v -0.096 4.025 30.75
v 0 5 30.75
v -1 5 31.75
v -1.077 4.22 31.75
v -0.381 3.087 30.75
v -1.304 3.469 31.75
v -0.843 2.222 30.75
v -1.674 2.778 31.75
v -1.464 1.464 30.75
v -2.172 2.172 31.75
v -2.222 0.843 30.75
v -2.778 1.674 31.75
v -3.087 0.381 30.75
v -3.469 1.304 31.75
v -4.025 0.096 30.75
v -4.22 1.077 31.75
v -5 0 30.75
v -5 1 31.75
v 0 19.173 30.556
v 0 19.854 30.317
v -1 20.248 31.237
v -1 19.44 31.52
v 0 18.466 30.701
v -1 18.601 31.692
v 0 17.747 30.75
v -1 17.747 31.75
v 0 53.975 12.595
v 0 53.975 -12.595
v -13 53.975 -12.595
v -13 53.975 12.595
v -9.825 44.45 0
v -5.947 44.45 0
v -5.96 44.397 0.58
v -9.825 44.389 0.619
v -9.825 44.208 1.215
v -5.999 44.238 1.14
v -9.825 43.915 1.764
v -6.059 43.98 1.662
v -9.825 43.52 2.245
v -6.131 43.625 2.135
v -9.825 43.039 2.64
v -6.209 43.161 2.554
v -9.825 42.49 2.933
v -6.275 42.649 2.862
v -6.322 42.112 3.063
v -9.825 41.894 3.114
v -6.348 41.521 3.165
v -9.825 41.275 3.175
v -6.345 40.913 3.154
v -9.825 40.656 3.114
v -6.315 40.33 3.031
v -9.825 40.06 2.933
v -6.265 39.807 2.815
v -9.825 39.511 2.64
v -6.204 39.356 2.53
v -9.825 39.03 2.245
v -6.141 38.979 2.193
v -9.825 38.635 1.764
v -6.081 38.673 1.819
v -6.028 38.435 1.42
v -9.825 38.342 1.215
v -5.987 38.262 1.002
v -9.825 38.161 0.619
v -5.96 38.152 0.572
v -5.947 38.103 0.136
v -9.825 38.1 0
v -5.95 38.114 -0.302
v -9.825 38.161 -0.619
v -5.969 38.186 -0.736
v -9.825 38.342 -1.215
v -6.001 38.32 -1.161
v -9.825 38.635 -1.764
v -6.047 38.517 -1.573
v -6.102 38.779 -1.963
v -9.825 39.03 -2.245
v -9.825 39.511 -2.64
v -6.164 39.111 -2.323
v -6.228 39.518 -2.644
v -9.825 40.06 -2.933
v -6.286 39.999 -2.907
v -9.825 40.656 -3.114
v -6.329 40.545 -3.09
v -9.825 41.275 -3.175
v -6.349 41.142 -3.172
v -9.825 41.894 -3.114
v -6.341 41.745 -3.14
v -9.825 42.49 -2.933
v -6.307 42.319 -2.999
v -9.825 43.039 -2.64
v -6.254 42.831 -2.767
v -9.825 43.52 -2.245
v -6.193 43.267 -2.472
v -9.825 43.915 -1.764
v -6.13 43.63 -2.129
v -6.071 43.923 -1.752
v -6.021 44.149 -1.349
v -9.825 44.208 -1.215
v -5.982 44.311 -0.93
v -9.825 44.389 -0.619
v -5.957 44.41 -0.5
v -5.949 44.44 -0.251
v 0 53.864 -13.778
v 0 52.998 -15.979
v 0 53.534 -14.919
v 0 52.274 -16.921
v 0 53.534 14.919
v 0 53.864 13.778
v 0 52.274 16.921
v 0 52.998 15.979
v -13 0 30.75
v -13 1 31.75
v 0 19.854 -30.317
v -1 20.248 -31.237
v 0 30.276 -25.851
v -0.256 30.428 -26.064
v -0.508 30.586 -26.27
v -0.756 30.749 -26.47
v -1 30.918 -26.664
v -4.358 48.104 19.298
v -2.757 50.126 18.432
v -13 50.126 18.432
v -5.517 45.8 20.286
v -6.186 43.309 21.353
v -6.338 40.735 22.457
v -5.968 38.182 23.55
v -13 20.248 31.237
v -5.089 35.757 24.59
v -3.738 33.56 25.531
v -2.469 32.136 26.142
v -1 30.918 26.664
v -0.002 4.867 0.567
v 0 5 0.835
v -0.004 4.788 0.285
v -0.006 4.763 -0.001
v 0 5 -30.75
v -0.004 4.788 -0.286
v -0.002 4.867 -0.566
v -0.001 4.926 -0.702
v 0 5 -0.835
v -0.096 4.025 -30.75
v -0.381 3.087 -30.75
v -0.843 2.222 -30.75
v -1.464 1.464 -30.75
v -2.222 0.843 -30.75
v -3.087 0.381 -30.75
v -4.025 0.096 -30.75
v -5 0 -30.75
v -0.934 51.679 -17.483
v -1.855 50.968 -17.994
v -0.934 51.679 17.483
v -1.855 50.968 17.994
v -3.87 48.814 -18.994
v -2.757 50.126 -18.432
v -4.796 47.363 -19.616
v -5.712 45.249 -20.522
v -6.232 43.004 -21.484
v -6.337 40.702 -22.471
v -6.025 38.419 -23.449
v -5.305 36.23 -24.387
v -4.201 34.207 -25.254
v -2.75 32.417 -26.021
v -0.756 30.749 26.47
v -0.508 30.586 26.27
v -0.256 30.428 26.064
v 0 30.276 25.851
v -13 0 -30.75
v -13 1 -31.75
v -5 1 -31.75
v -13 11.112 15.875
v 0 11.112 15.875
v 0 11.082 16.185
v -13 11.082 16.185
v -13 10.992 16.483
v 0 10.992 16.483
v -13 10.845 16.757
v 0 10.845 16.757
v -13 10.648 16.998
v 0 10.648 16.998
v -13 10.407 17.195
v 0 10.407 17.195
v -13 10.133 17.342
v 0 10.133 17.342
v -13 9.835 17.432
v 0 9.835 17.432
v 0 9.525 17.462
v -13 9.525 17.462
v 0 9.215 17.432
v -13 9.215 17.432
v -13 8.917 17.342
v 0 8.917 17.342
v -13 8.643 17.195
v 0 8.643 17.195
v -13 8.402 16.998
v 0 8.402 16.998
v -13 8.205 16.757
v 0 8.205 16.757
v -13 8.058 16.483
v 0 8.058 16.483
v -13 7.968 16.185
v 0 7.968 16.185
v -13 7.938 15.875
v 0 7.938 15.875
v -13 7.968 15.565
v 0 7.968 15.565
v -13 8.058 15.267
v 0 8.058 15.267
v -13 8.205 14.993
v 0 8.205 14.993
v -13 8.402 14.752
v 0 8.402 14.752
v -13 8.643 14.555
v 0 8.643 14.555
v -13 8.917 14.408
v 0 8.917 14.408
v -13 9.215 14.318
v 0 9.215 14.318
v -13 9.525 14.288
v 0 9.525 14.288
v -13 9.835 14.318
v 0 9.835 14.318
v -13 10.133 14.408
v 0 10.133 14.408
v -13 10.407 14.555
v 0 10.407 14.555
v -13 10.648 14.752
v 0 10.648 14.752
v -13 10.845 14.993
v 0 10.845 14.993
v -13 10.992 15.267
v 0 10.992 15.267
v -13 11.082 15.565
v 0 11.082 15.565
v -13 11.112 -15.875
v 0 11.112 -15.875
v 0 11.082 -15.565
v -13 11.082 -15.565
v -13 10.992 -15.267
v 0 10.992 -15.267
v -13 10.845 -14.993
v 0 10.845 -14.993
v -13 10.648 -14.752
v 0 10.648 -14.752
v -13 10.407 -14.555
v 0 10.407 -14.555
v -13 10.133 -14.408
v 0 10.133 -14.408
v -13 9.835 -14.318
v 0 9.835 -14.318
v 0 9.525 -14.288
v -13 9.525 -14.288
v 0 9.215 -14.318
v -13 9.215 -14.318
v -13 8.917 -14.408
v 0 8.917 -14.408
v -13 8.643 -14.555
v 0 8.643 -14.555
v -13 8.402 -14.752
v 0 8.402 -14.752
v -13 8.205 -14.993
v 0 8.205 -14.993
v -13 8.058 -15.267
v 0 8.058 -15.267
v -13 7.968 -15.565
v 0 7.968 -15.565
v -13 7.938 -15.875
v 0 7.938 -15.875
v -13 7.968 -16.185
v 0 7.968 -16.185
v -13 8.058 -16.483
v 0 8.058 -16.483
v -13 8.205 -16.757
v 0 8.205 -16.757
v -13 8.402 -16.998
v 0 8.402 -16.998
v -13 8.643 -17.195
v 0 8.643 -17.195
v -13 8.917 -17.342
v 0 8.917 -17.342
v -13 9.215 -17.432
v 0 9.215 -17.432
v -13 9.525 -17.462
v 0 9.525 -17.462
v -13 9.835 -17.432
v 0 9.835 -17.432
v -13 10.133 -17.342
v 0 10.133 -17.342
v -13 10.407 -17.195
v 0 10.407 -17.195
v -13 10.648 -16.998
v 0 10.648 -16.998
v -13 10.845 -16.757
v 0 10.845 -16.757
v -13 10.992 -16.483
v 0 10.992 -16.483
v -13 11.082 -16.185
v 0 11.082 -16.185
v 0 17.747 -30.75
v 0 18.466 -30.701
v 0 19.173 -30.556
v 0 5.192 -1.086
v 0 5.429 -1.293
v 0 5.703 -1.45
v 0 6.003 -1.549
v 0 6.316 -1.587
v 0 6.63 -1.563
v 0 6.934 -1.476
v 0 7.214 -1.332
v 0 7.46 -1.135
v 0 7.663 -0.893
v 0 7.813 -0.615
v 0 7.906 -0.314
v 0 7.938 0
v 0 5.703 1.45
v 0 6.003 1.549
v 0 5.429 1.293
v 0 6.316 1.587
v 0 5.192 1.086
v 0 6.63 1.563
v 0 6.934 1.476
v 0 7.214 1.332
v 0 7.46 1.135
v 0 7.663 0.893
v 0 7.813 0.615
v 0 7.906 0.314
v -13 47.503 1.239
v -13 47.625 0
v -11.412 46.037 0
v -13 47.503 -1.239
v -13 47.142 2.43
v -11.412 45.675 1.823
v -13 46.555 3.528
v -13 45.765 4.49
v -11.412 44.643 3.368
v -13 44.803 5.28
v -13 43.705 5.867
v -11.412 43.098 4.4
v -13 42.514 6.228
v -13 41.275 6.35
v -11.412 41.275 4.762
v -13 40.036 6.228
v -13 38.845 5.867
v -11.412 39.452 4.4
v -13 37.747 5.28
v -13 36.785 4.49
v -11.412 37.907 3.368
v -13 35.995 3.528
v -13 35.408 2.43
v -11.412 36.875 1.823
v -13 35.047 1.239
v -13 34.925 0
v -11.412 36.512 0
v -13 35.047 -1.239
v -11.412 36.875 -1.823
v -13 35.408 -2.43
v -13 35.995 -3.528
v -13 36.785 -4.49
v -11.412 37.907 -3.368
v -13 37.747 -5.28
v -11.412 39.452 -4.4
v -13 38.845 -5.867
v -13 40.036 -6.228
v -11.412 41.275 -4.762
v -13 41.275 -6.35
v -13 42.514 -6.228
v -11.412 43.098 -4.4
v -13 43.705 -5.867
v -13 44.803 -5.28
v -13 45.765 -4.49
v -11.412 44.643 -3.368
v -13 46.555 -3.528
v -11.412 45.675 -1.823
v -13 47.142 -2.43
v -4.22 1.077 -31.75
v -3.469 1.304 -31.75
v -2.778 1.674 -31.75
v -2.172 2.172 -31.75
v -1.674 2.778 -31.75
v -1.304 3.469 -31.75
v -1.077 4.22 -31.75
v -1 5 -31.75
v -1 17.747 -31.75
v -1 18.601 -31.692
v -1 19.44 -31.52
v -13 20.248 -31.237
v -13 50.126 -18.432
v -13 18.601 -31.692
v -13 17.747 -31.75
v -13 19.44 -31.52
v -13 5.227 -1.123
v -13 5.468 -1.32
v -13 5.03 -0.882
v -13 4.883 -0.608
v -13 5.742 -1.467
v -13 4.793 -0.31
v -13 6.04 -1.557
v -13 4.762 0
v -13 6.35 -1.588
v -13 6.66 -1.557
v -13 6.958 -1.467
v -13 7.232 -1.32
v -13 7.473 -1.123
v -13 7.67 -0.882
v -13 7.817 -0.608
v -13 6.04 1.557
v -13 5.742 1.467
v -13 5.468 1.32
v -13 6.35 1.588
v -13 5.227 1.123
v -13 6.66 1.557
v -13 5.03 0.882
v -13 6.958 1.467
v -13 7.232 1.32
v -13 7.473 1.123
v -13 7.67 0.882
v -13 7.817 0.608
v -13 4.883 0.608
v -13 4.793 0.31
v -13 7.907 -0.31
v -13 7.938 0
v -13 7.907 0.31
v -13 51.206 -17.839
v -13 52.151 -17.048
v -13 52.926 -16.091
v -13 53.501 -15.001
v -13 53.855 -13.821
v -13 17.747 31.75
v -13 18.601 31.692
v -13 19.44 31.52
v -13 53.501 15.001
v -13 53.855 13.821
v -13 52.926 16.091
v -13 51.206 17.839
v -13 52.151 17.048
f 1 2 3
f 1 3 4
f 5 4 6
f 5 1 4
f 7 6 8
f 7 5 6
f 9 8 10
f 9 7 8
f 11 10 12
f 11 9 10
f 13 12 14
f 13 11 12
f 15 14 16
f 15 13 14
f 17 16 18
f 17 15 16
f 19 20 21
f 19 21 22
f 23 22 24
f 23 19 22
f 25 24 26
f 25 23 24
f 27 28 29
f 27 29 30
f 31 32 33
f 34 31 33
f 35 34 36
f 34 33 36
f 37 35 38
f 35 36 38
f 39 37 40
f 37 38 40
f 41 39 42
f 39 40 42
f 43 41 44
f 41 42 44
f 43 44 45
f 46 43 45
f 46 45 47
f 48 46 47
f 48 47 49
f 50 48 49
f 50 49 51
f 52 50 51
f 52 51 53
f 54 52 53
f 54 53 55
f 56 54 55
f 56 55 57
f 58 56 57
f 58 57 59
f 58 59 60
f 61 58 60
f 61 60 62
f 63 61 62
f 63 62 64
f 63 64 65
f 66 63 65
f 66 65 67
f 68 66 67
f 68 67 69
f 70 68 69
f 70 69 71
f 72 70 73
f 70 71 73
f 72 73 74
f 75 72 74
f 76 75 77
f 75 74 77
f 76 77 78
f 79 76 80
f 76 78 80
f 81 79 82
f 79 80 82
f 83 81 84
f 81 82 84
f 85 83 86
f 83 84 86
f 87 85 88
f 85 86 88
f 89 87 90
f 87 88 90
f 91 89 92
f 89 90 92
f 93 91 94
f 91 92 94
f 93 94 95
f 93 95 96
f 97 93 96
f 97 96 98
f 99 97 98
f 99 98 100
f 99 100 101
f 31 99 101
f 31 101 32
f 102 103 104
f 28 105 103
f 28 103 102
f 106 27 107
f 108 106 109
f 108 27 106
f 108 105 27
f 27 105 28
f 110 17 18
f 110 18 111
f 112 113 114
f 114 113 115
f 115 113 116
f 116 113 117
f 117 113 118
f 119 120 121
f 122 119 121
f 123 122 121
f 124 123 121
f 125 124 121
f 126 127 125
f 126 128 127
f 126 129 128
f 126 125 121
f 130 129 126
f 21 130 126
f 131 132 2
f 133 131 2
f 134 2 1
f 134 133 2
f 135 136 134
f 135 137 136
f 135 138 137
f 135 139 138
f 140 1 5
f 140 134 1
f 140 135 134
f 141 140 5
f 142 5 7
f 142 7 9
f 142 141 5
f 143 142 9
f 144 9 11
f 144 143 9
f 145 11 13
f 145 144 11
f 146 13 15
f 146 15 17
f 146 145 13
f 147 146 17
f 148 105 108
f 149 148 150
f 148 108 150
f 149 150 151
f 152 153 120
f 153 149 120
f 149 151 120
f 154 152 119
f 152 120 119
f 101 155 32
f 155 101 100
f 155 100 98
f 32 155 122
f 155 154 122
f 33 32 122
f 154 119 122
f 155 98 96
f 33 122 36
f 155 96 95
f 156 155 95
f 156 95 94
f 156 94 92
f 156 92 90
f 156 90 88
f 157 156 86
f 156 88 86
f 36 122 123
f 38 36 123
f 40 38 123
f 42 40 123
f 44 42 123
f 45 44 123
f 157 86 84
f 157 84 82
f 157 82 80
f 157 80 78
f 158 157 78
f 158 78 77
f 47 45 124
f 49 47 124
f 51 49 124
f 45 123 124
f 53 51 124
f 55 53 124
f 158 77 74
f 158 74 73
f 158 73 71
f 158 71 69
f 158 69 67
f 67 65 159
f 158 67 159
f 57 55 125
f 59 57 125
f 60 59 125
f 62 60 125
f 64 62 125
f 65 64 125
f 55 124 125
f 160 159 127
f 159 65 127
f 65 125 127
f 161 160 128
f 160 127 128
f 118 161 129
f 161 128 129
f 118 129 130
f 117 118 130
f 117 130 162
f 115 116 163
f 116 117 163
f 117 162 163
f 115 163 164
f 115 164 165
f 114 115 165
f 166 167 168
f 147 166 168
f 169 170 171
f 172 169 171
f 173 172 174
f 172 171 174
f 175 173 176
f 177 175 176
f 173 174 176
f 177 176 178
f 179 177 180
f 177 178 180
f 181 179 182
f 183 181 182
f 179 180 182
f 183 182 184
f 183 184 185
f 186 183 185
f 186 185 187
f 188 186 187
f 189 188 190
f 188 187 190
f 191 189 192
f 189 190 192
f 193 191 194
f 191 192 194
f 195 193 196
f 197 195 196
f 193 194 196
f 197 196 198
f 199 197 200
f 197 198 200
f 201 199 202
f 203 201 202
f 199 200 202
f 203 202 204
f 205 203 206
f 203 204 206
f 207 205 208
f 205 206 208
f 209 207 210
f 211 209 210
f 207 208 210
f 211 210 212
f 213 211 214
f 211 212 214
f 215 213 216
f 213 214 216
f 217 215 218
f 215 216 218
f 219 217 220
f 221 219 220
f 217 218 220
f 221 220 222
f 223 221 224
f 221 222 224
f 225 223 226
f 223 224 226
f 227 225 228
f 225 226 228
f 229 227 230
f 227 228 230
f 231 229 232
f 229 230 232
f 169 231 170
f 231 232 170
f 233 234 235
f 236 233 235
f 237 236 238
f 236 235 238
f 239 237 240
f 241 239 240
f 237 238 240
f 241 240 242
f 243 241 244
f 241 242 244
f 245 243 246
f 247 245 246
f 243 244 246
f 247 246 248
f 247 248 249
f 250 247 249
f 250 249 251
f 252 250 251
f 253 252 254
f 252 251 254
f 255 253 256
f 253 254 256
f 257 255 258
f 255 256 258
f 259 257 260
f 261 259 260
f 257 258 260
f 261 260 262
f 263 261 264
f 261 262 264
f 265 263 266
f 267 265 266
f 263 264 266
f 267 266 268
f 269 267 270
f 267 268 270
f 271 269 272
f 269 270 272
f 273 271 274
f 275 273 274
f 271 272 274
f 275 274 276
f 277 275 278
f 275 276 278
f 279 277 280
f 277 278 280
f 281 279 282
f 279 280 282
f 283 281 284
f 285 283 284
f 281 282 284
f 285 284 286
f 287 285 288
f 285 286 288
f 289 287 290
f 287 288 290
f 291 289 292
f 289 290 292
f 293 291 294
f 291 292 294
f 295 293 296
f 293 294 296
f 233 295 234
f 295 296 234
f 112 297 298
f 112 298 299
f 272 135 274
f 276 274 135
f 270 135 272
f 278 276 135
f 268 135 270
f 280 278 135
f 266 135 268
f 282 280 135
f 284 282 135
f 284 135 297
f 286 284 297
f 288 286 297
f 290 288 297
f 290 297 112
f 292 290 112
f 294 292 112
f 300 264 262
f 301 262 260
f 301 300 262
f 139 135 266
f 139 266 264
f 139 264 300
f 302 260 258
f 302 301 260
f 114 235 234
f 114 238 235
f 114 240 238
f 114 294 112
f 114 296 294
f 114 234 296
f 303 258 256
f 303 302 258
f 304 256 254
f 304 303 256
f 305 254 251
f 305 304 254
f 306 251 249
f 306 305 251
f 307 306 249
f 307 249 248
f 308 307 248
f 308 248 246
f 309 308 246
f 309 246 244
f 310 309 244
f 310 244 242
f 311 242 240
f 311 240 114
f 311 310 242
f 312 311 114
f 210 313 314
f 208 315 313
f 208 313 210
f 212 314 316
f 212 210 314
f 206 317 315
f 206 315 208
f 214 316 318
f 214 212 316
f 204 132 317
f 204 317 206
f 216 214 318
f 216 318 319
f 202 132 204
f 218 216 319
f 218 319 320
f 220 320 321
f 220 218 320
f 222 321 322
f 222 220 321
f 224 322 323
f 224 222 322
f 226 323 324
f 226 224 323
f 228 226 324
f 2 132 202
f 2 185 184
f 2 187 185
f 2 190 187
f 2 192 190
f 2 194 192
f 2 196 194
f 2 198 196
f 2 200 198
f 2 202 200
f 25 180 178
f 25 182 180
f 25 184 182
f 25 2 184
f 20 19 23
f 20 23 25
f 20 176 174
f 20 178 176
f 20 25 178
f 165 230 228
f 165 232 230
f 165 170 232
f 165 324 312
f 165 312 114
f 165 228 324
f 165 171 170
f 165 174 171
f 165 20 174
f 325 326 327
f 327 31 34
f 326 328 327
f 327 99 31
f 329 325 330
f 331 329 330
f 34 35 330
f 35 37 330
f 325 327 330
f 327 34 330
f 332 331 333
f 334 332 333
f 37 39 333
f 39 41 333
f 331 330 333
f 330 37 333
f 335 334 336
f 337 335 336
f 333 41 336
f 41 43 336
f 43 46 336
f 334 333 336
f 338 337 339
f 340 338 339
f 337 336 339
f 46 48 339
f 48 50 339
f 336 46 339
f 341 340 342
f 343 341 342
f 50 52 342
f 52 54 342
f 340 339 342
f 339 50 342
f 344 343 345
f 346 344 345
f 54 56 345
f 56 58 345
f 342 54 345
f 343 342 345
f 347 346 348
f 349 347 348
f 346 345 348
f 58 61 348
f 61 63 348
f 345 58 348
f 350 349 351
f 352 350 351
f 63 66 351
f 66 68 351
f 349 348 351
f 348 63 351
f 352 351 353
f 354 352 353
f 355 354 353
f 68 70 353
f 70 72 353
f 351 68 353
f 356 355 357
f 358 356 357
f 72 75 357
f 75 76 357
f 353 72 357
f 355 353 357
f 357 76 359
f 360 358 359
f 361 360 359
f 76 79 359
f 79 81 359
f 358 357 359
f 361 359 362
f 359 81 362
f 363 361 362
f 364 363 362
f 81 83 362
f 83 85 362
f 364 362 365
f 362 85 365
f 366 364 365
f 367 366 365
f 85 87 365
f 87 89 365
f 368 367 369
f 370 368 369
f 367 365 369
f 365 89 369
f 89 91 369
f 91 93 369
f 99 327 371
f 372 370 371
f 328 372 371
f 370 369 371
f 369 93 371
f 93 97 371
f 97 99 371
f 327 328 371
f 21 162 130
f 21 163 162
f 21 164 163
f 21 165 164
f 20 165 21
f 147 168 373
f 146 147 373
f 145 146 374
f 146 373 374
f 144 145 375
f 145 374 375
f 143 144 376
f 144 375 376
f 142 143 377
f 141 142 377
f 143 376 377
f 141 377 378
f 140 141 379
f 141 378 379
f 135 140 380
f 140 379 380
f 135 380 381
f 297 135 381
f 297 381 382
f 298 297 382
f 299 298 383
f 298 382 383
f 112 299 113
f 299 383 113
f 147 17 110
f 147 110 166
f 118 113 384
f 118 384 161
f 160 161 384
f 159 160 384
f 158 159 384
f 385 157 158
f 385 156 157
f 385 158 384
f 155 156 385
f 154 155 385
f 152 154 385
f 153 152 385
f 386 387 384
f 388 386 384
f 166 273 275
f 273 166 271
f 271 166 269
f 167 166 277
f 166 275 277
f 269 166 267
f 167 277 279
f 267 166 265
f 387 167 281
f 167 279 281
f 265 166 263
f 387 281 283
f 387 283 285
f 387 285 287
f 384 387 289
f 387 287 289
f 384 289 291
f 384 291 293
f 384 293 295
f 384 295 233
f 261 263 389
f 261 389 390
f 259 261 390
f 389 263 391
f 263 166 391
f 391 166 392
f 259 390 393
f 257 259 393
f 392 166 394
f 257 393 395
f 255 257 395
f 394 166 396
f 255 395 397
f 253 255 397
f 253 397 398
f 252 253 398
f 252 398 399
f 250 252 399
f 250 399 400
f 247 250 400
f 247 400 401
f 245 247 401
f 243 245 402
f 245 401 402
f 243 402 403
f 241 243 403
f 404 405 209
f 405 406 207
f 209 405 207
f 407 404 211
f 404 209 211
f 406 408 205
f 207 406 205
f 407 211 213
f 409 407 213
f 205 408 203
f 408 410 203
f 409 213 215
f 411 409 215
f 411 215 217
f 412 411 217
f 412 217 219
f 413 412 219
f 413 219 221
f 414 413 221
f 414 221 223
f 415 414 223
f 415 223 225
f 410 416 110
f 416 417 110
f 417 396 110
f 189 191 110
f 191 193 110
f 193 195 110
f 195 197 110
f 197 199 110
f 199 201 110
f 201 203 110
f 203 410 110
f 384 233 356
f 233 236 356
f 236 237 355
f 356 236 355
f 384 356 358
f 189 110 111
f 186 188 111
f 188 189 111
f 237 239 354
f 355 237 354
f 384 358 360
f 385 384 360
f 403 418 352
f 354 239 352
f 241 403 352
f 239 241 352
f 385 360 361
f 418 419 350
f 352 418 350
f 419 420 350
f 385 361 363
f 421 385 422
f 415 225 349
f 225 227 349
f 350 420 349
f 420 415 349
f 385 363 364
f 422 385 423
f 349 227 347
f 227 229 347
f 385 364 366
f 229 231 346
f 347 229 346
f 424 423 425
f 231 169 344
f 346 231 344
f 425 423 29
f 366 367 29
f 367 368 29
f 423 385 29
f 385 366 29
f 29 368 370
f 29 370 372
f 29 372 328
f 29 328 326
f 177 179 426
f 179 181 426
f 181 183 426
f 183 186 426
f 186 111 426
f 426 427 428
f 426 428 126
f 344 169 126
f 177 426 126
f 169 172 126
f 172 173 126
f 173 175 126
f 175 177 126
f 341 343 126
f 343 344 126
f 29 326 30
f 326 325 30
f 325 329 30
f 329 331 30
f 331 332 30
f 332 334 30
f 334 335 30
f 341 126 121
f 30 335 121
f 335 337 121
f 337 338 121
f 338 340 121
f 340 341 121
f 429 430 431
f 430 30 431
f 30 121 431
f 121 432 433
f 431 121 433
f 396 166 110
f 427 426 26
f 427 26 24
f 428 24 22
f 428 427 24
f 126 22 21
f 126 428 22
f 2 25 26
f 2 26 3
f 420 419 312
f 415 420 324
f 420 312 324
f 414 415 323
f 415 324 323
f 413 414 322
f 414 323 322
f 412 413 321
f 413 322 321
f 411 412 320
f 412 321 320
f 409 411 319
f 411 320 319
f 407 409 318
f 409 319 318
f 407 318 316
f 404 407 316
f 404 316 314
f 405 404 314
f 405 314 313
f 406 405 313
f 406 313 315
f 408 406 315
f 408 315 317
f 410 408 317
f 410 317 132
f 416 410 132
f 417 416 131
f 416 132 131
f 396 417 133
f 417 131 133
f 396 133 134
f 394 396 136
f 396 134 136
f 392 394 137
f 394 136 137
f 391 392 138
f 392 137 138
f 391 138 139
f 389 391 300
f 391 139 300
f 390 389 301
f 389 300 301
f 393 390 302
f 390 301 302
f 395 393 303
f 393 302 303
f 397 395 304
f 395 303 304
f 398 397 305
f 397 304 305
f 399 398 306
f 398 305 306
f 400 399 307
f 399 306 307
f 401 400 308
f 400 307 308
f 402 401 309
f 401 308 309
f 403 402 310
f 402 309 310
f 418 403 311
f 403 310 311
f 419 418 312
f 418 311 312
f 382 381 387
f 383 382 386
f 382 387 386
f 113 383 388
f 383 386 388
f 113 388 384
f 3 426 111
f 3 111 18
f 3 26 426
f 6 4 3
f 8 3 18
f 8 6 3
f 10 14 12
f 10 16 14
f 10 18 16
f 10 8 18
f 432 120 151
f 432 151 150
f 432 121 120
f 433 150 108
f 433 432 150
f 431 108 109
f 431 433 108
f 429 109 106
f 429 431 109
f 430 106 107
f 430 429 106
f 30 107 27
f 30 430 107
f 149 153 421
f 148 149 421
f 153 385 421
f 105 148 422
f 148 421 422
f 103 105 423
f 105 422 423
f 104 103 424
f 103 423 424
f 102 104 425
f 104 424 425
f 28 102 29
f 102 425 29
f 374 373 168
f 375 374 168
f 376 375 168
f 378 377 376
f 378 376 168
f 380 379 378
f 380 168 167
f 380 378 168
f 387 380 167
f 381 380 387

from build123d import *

# Parameters (mm, degrees)
F0_R        = 1.5875
F0_R_2      = 3.175
F1_DEPTH    = 13
F3_DEPTH    = 37.5
F4_R        = 6.35
F5_T1_DEPTH = 88.5
F6_SIZE     = 1
F7_SIZE     = 3.175


# Not quite as in the source:
# - a fillet or chamfer that OpenCascade refuses, or shapes differently, is made with other operations: its cross-section is extruded or revolved along the edge and cut away or added
# - a feature names something its author has since deleted; it is built from what else it names


with BuildPart() as f1:
    # F0 (on Right) → F1 (new body)
    with BuildSketch(Plane.YZ):
        Polygon((0, 31.75), (0, 0), (0, -31.75), (19.05, -31.75), (53.975, -16.7821428571), (53.975, 16.7821428571), (19.05, 31.75), align=None)
        with Locations((9.525, -15.875)):
            Circle(F0_R, mode=Mode.SUBTRACT)
        with Locations((6.35, 0)):
            Circle(F0_R, mode=Mode.SUBTRACT)
        with Locations((9.525, 15.875)):
            Circle(F0_R, mode=Mode.SUBTRACT)
        with Locations((41.275, 0)):
            Circle(F0_R_2, mode=Mode.SUBTRACT)
    extrude(amount=-F1_DEPTH)

    # F2 (on Top) → F3 (cut, symmetric)
    with BuildSketch(Plane.XY):
        with BuildLine():
            Line((0, 30.2764773719), (0, 52.2735226281))
            ThreePointArc((0, 52.2735226281), (-6.35, 41.275), (0, 30.2764773719))
        make_face()
    extrude(amount=F3_DEPTH, both=True, mode=Mode.SUBTRACT)

    # F4
    f4_edges = [f1.edges().sort_by_distance(p)[0] for p in [
        (-6.5, 19.05, 31.75),
        (-6.5, 19.05, -31.75),
        (-6.5, 53.975, 16.782143),
        (-6.5, 53.975, -16.782143),
    ]]
    fillet(f4_edges, radius=F4_R)

    # F5: fillet of radius 5 on 1 edges, made by hand

    # F5_s2 → F5_t1 (cut)
    with BuildSketch(Plane.XY.offset(-44.25)):
        with BuildLine():
            ThreePointArc((0, 5), (-1.4644660941, 1.4644660941), (-5, 0))
            Line((-5, 0), (0, 0))
            Line((0, 0), (0, 5))
        make_face()
    extrude(amount=F5_T1_DEPTH, mode=Mode.SUBTRACT)

    # F6
    f6_edges = [f1.edges().sort_by_distance(p)[0] for p in [
        (0, 11.373307, 31.75),
        (0, 25.262239, -29.087612),
        (0, 25.262239, 29.087612),
        (0, 19.023382, -31.620319),
        (0, 11.373307, -31.75),
        (0, 19.023382, 31.620319),
        (-9, 0, -31.75),
        (-1.464466, 1.464466, -31.75),
        (-1.464466, 1.464466, 31.75),
        (-9, 0, 31.75),
    ]]
    chamfer(f6_edges, length=F6_SIZE)

    # F7
    f7_edges = [f1.edges().sort_by_distance(p)[0] for p in [
        (-13, 38.1, 0),
    ]]
    chamfer(f7_edges, length=F7_SIZE)


solid = f1.part
